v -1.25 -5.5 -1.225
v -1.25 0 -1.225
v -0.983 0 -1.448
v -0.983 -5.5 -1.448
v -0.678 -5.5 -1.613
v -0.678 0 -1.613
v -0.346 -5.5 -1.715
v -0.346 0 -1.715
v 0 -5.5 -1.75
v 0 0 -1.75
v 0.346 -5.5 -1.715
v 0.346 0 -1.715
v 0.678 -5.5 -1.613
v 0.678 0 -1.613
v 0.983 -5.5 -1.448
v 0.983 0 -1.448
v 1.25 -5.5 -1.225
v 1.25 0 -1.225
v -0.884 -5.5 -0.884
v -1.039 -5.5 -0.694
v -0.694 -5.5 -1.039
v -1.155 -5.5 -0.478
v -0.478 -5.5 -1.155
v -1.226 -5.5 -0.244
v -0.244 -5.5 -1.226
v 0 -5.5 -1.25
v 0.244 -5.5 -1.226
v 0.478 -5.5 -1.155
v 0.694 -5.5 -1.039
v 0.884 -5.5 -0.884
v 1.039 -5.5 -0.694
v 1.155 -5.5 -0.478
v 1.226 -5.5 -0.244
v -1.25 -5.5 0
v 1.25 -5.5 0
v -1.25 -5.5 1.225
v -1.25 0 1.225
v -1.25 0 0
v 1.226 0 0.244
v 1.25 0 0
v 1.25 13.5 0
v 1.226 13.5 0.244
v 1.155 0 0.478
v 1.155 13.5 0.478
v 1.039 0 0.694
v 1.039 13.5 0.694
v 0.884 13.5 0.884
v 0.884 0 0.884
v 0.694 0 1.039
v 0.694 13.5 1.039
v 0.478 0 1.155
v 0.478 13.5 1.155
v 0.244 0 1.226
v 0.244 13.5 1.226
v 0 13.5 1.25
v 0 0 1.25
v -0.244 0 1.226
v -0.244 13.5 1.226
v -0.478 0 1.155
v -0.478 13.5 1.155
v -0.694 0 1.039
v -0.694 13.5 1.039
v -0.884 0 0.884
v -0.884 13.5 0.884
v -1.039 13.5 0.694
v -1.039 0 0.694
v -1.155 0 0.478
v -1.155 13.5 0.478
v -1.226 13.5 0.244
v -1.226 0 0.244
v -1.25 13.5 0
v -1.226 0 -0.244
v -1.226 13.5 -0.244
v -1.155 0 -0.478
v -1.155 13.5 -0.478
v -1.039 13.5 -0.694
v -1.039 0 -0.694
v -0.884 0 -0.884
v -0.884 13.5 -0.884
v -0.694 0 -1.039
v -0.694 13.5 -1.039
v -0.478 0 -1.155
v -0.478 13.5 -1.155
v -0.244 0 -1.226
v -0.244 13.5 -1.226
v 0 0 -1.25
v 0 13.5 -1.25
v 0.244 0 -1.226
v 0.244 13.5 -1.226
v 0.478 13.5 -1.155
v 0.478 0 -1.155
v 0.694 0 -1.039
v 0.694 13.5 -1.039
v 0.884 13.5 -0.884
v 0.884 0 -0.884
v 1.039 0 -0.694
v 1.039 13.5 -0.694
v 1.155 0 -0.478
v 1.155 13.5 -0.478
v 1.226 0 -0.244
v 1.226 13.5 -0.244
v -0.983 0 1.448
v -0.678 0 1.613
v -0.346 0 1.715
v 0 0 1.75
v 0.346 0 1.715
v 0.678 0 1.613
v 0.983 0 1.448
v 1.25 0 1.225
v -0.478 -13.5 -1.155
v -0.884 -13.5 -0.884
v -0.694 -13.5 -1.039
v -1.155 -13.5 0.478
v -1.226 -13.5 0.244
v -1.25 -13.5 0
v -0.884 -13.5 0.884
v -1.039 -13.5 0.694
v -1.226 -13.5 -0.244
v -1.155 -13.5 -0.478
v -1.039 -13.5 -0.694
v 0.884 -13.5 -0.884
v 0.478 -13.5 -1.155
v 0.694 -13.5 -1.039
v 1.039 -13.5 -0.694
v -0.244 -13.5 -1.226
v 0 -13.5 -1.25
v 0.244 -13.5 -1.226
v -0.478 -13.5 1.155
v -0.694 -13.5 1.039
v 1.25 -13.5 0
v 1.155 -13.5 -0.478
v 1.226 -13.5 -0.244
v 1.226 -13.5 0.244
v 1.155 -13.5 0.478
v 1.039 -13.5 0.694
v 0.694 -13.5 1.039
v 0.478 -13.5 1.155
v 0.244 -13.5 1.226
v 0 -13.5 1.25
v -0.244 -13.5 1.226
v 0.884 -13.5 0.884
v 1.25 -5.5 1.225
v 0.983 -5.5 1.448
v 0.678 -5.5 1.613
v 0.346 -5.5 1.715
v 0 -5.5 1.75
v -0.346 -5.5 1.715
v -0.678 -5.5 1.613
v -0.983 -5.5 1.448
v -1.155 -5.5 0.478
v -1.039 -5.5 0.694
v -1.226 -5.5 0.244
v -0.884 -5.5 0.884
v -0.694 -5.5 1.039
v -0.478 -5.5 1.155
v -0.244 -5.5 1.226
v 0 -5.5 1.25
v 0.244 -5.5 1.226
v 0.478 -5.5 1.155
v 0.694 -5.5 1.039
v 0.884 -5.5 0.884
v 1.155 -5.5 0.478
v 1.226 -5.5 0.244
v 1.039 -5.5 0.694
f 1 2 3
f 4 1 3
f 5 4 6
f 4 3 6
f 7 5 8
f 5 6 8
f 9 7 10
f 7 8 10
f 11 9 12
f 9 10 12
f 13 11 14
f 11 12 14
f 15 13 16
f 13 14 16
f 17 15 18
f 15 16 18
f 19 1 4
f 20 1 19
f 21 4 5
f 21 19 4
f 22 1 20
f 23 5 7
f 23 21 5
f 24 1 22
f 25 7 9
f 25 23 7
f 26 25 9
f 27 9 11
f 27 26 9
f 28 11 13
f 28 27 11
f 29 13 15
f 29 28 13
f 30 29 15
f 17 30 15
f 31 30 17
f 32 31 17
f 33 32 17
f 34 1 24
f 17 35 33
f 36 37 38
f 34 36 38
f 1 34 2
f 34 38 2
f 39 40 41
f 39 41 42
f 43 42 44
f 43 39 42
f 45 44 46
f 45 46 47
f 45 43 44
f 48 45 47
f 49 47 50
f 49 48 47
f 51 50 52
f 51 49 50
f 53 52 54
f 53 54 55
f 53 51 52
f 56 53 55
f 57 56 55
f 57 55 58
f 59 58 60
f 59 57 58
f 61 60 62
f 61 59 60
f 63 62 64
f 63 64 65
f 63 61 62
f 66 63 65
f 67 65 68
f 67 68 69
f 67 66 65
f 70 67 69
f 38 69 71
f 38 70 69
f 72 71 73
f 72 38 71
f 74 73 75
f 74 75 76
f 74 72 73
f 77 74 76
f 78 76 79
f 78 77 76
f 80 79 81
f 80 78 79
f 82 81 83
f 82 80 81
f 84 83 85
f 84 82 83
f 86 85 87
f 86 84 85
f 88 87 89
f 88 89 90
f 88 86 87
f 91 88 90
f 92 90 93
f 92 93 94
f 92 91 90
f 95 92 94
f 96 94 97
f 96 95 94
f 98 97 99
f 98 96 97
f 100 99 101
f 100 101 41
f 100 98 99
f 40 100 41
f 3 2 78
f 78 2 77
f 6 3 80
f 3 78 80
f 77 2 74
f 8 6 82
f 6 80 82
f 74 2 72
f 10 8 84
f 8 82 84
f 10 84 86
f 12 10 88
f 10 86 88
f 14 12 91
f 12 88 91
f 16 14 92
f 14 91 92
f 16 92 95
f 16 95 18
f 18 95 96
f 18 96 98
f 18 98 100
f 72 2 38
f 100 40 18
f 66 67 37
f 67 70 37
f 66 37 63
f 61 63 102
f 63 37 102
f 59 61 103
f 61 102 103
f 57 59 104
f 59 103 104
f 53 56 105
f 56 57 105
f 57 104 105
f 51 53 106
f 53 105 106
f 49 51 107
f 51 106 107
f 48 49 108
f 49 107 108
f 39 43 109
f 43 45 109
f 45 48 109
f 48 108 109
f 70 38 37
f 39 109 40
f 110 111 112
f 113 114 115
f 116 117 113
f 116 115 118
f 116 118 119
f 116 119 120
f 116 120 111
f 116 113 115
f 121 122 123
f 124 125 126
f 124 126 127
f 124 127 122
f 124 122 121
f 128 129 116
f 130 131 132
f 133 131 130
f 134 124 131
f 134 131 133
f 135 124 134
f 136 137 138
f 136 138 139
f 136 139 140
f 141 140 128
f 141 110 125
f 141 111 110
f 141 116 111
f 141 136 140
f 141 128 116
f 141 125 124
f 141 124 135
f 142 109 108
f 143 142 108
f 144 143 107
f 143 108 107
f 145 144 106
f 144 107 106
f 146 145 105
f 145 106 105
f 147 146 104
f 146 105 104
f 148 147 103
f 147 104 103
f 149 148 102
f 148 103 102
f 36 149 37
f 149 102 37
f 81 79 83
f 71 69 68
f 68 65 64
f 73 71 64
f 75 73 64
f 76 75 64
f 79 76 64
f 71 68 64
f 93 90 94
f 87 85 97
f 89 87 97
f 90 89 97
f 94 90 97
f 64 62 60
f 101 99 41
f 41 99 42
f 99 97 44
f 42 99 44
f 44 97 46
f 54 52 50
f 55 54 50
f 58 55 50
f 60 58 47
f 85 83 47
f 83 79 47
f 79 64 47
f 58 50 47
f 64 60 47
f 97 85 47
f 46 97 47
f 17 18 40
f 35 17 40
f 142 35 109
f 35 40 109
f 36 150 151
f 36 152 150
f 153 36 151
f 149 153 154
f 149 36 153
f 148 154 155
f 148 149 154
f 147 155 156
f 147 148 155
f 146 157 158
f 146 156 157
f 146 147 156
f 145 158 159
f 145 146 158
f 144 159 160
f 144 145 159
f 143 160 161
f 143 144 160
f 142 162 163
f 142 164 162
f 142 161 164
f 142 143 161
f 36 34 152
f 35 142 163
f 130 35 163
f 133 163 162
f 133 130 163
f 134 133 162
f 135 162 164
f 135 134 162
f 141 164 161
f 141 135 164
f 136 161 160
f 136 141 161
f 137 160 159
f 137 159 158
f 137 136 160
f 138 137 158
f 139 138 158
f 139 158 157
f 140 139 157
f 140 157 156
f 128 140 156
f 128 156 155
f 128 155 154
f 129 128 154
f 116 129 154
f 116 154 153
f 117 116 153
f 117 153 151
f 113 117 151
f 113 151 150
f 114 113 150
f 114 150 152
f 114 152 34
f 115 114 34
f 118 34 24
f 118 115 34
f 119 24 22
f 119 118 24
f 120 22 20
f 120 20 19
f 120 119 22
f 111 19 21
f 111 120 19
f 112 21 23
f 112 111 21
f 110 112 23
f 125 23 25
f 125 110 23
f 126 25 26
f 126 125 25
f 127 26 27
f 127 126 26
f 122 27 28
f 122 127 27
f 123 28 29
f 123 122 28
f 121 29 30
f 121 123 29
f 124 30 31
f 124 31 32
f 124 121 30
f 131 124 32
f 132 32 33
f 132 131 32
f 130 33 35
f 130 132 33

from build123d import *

# Parameters (mm, degrees)
F1_DEPTH = 5.5
F2_R     = 1.25
F3_DEPTH = 13.5


with BuildPart() as f1:
    # F0 (on Front) → F1 (new body)
    with BuildSketch(Plane.XZ):
        with BuildLine():
            Line((-1.25, 1.224745), (-1.25, -1.224745))
            ThreePointArc((-1.25, -1.224745), (0, -1.75), (1.25, -1.224745))
            Line((1.25, -1.224745), (1.25, 1.224745))
            ThreePointArc((1.25, 1.224745), (0, 1.75), (-1.25, 1.224745))
        make_face()
    extrude(amount=F1_DEPTH)

    # F2 (on Front) → F3 (join, symmetric)
    with BuildSketch(Plane.XZ):
        Circle(F2_R)
    extrude(amount=F3_DEPTH, both=True)


solid = f1.part
